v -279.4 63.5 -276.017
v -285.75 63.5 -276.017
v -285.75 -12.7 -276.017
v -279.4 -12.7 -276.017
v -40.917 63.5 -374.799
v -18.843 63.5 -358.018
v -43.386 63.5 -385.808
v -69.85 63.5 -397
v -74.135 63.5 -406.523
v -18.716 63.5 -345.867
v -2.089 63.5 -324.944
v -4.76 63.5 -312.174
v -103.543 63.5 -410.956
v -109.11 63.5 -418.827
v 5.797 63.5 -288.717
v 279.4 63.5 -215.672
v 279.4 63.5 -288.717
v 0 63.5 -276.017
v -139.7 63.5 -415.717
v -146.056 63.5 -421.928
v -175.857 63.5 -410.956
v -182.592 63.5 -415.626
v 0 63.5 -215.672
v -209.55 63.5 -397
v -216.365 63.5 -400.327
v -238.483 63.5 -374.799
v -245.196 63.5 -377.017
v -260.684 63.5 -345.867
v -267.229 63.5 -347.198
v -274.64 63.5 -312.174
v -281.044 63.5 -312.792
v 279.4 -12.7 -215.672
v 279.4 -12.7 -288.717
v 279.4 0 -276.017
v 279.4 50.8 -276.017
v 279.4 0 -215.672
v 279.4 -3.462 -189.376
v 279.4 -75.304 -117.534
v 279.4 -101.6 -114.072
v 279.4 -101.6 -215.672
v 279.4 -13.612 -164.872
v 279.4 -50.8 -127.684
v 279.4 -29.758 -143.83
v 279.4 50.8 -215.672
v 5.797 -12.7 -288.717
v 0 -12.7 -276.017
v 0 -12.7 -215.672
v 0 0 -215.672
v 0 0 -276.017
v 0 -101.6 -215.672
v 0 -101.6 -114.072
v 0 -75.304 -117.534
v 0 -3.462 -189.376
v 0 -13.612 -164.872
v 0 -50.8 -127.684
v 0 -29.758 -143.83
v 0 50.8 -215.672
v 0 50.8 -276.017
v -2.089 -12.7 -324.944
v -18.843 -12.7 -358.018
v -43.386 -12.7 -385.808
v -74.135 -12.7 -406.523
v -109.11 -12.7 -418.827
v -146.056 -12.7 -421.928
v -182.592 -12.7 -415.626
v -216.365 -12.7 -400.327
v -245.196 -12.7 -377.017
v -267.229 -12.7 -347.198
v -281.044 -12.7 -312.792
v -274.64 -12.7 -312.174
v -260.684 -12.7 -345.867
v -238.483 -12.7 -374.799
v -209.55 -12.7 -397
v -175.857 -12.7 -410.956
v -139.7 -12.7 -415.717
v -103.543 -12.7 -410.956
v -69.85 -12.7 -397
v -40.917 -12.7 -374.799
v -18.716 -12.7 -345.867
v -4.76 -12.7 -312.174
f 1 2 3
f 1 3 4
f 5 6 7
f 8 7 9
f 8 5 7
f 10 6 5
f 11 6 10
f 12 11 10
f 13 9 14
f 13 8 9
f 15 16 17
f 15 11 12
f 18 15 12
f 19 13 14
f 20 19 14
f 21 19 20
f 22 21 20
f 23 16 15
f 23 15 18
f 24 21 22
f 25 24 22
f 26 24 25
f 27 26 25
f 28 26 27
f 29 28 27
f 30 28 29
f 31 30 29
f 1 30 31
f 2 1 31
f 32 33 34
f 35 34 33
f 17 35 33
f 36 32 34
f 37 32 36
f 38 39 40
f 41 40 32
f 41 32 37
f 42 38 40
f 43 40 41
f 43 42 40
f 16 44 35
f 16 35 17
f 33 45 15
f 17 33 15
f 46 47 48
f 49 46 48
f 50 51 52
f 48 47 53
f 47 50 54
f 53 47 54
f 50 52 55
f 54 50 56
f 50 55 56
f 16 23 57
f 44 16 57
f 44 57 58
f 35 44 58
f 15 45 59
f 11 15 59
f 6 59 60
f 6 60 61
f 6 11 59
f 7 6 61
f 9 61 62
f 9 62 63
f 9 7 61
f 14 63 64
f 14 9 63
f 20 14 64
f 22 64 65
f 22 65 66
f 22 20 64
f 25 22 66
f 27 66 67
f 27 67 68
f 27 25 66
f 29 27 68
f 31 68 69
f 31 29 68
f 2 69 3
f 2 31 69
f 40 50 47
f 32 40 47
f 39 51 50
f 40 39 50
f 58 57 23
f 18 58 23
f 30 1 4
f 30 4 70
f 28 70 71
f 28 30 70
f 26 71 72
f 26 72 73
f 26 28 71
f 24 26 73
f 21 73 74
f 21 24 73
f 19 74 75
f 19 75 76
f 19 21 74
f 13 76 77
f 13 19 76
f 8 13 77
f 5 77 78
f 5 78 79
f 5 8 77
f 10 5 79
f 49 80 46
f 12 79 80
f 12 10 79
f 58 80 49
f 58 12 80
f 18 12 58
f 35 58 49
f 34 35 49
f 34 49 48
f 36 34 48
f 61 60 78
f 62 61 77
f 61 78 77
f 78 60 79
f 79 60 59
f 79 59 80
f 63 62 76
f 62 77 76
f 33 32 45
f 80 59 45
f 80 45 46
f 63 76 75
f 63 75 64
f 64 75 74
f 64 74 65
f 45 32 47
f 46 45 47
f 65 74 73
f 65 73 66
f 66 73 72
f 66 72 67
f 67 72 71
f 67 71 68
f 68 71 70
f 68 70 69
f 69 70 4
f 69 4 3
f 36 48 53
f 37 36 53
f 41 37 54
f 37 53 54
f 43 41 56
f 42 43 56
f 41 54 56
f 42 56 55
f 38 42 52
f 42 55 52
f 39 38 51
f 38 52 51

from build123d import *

# Parameters (mm, degrees)
F1_DEPTH = 279.4
F3_DEPTH = 76.2


with BuildPart() as f1:
    # F0 (on Right) → F1 (new body)
    with BuildSketch(Plane.YZ):
        with BuildLine():
            Line((-101.6, -114.072286), (-101.6, -215.672286))
            Line((-101.6, -215.672286), (-12.7, -215.672286))
            Line((-12.7, -215.672286), (-12.7, -288.716509))
            Line((-12.7, -288.716509), (63.5, -288.716509))
            Line((63.5, -288.716509), (63.5, -215.672286))
            Line((63.5, -215.672286), (50.8, -215.672286))
            Line((50.8, -215.672286), (50.8, -276.016509))
            Line((50.8, -276.016509), (0, -276.016509))
            Line((0, -276.016509), (0, -215.672286))
            ThreePointArc((0, -215.672286), (-29.757951, -143.830237), (-101.6, -114.072286))
        make_face()
    extrude(amount=F1_DEPTH)

    # F2 (on face) → F3 (join)
    with BuildSketch(Plane(origin=(0, 63.5, 0), x_dir=(-1, 0, 0), z_dir=(0, 1, 0))):
        with BuildLine():
            ThreePointArc((279.4, -276.016509), (139.7, -415.716509), (0, -276.016509))
            Line((0, -276.016509), (-6.35, -276.016509))
            ThreePointArc((-6.35, -276.016509), (139.7, -422.066509), (285.75, -276.016509))
            Line((285.75, -276.016509), (279.4, -276.016509))
        make_face()
    extrude(amount=-F3_DEPTH)


solid = f1.part
